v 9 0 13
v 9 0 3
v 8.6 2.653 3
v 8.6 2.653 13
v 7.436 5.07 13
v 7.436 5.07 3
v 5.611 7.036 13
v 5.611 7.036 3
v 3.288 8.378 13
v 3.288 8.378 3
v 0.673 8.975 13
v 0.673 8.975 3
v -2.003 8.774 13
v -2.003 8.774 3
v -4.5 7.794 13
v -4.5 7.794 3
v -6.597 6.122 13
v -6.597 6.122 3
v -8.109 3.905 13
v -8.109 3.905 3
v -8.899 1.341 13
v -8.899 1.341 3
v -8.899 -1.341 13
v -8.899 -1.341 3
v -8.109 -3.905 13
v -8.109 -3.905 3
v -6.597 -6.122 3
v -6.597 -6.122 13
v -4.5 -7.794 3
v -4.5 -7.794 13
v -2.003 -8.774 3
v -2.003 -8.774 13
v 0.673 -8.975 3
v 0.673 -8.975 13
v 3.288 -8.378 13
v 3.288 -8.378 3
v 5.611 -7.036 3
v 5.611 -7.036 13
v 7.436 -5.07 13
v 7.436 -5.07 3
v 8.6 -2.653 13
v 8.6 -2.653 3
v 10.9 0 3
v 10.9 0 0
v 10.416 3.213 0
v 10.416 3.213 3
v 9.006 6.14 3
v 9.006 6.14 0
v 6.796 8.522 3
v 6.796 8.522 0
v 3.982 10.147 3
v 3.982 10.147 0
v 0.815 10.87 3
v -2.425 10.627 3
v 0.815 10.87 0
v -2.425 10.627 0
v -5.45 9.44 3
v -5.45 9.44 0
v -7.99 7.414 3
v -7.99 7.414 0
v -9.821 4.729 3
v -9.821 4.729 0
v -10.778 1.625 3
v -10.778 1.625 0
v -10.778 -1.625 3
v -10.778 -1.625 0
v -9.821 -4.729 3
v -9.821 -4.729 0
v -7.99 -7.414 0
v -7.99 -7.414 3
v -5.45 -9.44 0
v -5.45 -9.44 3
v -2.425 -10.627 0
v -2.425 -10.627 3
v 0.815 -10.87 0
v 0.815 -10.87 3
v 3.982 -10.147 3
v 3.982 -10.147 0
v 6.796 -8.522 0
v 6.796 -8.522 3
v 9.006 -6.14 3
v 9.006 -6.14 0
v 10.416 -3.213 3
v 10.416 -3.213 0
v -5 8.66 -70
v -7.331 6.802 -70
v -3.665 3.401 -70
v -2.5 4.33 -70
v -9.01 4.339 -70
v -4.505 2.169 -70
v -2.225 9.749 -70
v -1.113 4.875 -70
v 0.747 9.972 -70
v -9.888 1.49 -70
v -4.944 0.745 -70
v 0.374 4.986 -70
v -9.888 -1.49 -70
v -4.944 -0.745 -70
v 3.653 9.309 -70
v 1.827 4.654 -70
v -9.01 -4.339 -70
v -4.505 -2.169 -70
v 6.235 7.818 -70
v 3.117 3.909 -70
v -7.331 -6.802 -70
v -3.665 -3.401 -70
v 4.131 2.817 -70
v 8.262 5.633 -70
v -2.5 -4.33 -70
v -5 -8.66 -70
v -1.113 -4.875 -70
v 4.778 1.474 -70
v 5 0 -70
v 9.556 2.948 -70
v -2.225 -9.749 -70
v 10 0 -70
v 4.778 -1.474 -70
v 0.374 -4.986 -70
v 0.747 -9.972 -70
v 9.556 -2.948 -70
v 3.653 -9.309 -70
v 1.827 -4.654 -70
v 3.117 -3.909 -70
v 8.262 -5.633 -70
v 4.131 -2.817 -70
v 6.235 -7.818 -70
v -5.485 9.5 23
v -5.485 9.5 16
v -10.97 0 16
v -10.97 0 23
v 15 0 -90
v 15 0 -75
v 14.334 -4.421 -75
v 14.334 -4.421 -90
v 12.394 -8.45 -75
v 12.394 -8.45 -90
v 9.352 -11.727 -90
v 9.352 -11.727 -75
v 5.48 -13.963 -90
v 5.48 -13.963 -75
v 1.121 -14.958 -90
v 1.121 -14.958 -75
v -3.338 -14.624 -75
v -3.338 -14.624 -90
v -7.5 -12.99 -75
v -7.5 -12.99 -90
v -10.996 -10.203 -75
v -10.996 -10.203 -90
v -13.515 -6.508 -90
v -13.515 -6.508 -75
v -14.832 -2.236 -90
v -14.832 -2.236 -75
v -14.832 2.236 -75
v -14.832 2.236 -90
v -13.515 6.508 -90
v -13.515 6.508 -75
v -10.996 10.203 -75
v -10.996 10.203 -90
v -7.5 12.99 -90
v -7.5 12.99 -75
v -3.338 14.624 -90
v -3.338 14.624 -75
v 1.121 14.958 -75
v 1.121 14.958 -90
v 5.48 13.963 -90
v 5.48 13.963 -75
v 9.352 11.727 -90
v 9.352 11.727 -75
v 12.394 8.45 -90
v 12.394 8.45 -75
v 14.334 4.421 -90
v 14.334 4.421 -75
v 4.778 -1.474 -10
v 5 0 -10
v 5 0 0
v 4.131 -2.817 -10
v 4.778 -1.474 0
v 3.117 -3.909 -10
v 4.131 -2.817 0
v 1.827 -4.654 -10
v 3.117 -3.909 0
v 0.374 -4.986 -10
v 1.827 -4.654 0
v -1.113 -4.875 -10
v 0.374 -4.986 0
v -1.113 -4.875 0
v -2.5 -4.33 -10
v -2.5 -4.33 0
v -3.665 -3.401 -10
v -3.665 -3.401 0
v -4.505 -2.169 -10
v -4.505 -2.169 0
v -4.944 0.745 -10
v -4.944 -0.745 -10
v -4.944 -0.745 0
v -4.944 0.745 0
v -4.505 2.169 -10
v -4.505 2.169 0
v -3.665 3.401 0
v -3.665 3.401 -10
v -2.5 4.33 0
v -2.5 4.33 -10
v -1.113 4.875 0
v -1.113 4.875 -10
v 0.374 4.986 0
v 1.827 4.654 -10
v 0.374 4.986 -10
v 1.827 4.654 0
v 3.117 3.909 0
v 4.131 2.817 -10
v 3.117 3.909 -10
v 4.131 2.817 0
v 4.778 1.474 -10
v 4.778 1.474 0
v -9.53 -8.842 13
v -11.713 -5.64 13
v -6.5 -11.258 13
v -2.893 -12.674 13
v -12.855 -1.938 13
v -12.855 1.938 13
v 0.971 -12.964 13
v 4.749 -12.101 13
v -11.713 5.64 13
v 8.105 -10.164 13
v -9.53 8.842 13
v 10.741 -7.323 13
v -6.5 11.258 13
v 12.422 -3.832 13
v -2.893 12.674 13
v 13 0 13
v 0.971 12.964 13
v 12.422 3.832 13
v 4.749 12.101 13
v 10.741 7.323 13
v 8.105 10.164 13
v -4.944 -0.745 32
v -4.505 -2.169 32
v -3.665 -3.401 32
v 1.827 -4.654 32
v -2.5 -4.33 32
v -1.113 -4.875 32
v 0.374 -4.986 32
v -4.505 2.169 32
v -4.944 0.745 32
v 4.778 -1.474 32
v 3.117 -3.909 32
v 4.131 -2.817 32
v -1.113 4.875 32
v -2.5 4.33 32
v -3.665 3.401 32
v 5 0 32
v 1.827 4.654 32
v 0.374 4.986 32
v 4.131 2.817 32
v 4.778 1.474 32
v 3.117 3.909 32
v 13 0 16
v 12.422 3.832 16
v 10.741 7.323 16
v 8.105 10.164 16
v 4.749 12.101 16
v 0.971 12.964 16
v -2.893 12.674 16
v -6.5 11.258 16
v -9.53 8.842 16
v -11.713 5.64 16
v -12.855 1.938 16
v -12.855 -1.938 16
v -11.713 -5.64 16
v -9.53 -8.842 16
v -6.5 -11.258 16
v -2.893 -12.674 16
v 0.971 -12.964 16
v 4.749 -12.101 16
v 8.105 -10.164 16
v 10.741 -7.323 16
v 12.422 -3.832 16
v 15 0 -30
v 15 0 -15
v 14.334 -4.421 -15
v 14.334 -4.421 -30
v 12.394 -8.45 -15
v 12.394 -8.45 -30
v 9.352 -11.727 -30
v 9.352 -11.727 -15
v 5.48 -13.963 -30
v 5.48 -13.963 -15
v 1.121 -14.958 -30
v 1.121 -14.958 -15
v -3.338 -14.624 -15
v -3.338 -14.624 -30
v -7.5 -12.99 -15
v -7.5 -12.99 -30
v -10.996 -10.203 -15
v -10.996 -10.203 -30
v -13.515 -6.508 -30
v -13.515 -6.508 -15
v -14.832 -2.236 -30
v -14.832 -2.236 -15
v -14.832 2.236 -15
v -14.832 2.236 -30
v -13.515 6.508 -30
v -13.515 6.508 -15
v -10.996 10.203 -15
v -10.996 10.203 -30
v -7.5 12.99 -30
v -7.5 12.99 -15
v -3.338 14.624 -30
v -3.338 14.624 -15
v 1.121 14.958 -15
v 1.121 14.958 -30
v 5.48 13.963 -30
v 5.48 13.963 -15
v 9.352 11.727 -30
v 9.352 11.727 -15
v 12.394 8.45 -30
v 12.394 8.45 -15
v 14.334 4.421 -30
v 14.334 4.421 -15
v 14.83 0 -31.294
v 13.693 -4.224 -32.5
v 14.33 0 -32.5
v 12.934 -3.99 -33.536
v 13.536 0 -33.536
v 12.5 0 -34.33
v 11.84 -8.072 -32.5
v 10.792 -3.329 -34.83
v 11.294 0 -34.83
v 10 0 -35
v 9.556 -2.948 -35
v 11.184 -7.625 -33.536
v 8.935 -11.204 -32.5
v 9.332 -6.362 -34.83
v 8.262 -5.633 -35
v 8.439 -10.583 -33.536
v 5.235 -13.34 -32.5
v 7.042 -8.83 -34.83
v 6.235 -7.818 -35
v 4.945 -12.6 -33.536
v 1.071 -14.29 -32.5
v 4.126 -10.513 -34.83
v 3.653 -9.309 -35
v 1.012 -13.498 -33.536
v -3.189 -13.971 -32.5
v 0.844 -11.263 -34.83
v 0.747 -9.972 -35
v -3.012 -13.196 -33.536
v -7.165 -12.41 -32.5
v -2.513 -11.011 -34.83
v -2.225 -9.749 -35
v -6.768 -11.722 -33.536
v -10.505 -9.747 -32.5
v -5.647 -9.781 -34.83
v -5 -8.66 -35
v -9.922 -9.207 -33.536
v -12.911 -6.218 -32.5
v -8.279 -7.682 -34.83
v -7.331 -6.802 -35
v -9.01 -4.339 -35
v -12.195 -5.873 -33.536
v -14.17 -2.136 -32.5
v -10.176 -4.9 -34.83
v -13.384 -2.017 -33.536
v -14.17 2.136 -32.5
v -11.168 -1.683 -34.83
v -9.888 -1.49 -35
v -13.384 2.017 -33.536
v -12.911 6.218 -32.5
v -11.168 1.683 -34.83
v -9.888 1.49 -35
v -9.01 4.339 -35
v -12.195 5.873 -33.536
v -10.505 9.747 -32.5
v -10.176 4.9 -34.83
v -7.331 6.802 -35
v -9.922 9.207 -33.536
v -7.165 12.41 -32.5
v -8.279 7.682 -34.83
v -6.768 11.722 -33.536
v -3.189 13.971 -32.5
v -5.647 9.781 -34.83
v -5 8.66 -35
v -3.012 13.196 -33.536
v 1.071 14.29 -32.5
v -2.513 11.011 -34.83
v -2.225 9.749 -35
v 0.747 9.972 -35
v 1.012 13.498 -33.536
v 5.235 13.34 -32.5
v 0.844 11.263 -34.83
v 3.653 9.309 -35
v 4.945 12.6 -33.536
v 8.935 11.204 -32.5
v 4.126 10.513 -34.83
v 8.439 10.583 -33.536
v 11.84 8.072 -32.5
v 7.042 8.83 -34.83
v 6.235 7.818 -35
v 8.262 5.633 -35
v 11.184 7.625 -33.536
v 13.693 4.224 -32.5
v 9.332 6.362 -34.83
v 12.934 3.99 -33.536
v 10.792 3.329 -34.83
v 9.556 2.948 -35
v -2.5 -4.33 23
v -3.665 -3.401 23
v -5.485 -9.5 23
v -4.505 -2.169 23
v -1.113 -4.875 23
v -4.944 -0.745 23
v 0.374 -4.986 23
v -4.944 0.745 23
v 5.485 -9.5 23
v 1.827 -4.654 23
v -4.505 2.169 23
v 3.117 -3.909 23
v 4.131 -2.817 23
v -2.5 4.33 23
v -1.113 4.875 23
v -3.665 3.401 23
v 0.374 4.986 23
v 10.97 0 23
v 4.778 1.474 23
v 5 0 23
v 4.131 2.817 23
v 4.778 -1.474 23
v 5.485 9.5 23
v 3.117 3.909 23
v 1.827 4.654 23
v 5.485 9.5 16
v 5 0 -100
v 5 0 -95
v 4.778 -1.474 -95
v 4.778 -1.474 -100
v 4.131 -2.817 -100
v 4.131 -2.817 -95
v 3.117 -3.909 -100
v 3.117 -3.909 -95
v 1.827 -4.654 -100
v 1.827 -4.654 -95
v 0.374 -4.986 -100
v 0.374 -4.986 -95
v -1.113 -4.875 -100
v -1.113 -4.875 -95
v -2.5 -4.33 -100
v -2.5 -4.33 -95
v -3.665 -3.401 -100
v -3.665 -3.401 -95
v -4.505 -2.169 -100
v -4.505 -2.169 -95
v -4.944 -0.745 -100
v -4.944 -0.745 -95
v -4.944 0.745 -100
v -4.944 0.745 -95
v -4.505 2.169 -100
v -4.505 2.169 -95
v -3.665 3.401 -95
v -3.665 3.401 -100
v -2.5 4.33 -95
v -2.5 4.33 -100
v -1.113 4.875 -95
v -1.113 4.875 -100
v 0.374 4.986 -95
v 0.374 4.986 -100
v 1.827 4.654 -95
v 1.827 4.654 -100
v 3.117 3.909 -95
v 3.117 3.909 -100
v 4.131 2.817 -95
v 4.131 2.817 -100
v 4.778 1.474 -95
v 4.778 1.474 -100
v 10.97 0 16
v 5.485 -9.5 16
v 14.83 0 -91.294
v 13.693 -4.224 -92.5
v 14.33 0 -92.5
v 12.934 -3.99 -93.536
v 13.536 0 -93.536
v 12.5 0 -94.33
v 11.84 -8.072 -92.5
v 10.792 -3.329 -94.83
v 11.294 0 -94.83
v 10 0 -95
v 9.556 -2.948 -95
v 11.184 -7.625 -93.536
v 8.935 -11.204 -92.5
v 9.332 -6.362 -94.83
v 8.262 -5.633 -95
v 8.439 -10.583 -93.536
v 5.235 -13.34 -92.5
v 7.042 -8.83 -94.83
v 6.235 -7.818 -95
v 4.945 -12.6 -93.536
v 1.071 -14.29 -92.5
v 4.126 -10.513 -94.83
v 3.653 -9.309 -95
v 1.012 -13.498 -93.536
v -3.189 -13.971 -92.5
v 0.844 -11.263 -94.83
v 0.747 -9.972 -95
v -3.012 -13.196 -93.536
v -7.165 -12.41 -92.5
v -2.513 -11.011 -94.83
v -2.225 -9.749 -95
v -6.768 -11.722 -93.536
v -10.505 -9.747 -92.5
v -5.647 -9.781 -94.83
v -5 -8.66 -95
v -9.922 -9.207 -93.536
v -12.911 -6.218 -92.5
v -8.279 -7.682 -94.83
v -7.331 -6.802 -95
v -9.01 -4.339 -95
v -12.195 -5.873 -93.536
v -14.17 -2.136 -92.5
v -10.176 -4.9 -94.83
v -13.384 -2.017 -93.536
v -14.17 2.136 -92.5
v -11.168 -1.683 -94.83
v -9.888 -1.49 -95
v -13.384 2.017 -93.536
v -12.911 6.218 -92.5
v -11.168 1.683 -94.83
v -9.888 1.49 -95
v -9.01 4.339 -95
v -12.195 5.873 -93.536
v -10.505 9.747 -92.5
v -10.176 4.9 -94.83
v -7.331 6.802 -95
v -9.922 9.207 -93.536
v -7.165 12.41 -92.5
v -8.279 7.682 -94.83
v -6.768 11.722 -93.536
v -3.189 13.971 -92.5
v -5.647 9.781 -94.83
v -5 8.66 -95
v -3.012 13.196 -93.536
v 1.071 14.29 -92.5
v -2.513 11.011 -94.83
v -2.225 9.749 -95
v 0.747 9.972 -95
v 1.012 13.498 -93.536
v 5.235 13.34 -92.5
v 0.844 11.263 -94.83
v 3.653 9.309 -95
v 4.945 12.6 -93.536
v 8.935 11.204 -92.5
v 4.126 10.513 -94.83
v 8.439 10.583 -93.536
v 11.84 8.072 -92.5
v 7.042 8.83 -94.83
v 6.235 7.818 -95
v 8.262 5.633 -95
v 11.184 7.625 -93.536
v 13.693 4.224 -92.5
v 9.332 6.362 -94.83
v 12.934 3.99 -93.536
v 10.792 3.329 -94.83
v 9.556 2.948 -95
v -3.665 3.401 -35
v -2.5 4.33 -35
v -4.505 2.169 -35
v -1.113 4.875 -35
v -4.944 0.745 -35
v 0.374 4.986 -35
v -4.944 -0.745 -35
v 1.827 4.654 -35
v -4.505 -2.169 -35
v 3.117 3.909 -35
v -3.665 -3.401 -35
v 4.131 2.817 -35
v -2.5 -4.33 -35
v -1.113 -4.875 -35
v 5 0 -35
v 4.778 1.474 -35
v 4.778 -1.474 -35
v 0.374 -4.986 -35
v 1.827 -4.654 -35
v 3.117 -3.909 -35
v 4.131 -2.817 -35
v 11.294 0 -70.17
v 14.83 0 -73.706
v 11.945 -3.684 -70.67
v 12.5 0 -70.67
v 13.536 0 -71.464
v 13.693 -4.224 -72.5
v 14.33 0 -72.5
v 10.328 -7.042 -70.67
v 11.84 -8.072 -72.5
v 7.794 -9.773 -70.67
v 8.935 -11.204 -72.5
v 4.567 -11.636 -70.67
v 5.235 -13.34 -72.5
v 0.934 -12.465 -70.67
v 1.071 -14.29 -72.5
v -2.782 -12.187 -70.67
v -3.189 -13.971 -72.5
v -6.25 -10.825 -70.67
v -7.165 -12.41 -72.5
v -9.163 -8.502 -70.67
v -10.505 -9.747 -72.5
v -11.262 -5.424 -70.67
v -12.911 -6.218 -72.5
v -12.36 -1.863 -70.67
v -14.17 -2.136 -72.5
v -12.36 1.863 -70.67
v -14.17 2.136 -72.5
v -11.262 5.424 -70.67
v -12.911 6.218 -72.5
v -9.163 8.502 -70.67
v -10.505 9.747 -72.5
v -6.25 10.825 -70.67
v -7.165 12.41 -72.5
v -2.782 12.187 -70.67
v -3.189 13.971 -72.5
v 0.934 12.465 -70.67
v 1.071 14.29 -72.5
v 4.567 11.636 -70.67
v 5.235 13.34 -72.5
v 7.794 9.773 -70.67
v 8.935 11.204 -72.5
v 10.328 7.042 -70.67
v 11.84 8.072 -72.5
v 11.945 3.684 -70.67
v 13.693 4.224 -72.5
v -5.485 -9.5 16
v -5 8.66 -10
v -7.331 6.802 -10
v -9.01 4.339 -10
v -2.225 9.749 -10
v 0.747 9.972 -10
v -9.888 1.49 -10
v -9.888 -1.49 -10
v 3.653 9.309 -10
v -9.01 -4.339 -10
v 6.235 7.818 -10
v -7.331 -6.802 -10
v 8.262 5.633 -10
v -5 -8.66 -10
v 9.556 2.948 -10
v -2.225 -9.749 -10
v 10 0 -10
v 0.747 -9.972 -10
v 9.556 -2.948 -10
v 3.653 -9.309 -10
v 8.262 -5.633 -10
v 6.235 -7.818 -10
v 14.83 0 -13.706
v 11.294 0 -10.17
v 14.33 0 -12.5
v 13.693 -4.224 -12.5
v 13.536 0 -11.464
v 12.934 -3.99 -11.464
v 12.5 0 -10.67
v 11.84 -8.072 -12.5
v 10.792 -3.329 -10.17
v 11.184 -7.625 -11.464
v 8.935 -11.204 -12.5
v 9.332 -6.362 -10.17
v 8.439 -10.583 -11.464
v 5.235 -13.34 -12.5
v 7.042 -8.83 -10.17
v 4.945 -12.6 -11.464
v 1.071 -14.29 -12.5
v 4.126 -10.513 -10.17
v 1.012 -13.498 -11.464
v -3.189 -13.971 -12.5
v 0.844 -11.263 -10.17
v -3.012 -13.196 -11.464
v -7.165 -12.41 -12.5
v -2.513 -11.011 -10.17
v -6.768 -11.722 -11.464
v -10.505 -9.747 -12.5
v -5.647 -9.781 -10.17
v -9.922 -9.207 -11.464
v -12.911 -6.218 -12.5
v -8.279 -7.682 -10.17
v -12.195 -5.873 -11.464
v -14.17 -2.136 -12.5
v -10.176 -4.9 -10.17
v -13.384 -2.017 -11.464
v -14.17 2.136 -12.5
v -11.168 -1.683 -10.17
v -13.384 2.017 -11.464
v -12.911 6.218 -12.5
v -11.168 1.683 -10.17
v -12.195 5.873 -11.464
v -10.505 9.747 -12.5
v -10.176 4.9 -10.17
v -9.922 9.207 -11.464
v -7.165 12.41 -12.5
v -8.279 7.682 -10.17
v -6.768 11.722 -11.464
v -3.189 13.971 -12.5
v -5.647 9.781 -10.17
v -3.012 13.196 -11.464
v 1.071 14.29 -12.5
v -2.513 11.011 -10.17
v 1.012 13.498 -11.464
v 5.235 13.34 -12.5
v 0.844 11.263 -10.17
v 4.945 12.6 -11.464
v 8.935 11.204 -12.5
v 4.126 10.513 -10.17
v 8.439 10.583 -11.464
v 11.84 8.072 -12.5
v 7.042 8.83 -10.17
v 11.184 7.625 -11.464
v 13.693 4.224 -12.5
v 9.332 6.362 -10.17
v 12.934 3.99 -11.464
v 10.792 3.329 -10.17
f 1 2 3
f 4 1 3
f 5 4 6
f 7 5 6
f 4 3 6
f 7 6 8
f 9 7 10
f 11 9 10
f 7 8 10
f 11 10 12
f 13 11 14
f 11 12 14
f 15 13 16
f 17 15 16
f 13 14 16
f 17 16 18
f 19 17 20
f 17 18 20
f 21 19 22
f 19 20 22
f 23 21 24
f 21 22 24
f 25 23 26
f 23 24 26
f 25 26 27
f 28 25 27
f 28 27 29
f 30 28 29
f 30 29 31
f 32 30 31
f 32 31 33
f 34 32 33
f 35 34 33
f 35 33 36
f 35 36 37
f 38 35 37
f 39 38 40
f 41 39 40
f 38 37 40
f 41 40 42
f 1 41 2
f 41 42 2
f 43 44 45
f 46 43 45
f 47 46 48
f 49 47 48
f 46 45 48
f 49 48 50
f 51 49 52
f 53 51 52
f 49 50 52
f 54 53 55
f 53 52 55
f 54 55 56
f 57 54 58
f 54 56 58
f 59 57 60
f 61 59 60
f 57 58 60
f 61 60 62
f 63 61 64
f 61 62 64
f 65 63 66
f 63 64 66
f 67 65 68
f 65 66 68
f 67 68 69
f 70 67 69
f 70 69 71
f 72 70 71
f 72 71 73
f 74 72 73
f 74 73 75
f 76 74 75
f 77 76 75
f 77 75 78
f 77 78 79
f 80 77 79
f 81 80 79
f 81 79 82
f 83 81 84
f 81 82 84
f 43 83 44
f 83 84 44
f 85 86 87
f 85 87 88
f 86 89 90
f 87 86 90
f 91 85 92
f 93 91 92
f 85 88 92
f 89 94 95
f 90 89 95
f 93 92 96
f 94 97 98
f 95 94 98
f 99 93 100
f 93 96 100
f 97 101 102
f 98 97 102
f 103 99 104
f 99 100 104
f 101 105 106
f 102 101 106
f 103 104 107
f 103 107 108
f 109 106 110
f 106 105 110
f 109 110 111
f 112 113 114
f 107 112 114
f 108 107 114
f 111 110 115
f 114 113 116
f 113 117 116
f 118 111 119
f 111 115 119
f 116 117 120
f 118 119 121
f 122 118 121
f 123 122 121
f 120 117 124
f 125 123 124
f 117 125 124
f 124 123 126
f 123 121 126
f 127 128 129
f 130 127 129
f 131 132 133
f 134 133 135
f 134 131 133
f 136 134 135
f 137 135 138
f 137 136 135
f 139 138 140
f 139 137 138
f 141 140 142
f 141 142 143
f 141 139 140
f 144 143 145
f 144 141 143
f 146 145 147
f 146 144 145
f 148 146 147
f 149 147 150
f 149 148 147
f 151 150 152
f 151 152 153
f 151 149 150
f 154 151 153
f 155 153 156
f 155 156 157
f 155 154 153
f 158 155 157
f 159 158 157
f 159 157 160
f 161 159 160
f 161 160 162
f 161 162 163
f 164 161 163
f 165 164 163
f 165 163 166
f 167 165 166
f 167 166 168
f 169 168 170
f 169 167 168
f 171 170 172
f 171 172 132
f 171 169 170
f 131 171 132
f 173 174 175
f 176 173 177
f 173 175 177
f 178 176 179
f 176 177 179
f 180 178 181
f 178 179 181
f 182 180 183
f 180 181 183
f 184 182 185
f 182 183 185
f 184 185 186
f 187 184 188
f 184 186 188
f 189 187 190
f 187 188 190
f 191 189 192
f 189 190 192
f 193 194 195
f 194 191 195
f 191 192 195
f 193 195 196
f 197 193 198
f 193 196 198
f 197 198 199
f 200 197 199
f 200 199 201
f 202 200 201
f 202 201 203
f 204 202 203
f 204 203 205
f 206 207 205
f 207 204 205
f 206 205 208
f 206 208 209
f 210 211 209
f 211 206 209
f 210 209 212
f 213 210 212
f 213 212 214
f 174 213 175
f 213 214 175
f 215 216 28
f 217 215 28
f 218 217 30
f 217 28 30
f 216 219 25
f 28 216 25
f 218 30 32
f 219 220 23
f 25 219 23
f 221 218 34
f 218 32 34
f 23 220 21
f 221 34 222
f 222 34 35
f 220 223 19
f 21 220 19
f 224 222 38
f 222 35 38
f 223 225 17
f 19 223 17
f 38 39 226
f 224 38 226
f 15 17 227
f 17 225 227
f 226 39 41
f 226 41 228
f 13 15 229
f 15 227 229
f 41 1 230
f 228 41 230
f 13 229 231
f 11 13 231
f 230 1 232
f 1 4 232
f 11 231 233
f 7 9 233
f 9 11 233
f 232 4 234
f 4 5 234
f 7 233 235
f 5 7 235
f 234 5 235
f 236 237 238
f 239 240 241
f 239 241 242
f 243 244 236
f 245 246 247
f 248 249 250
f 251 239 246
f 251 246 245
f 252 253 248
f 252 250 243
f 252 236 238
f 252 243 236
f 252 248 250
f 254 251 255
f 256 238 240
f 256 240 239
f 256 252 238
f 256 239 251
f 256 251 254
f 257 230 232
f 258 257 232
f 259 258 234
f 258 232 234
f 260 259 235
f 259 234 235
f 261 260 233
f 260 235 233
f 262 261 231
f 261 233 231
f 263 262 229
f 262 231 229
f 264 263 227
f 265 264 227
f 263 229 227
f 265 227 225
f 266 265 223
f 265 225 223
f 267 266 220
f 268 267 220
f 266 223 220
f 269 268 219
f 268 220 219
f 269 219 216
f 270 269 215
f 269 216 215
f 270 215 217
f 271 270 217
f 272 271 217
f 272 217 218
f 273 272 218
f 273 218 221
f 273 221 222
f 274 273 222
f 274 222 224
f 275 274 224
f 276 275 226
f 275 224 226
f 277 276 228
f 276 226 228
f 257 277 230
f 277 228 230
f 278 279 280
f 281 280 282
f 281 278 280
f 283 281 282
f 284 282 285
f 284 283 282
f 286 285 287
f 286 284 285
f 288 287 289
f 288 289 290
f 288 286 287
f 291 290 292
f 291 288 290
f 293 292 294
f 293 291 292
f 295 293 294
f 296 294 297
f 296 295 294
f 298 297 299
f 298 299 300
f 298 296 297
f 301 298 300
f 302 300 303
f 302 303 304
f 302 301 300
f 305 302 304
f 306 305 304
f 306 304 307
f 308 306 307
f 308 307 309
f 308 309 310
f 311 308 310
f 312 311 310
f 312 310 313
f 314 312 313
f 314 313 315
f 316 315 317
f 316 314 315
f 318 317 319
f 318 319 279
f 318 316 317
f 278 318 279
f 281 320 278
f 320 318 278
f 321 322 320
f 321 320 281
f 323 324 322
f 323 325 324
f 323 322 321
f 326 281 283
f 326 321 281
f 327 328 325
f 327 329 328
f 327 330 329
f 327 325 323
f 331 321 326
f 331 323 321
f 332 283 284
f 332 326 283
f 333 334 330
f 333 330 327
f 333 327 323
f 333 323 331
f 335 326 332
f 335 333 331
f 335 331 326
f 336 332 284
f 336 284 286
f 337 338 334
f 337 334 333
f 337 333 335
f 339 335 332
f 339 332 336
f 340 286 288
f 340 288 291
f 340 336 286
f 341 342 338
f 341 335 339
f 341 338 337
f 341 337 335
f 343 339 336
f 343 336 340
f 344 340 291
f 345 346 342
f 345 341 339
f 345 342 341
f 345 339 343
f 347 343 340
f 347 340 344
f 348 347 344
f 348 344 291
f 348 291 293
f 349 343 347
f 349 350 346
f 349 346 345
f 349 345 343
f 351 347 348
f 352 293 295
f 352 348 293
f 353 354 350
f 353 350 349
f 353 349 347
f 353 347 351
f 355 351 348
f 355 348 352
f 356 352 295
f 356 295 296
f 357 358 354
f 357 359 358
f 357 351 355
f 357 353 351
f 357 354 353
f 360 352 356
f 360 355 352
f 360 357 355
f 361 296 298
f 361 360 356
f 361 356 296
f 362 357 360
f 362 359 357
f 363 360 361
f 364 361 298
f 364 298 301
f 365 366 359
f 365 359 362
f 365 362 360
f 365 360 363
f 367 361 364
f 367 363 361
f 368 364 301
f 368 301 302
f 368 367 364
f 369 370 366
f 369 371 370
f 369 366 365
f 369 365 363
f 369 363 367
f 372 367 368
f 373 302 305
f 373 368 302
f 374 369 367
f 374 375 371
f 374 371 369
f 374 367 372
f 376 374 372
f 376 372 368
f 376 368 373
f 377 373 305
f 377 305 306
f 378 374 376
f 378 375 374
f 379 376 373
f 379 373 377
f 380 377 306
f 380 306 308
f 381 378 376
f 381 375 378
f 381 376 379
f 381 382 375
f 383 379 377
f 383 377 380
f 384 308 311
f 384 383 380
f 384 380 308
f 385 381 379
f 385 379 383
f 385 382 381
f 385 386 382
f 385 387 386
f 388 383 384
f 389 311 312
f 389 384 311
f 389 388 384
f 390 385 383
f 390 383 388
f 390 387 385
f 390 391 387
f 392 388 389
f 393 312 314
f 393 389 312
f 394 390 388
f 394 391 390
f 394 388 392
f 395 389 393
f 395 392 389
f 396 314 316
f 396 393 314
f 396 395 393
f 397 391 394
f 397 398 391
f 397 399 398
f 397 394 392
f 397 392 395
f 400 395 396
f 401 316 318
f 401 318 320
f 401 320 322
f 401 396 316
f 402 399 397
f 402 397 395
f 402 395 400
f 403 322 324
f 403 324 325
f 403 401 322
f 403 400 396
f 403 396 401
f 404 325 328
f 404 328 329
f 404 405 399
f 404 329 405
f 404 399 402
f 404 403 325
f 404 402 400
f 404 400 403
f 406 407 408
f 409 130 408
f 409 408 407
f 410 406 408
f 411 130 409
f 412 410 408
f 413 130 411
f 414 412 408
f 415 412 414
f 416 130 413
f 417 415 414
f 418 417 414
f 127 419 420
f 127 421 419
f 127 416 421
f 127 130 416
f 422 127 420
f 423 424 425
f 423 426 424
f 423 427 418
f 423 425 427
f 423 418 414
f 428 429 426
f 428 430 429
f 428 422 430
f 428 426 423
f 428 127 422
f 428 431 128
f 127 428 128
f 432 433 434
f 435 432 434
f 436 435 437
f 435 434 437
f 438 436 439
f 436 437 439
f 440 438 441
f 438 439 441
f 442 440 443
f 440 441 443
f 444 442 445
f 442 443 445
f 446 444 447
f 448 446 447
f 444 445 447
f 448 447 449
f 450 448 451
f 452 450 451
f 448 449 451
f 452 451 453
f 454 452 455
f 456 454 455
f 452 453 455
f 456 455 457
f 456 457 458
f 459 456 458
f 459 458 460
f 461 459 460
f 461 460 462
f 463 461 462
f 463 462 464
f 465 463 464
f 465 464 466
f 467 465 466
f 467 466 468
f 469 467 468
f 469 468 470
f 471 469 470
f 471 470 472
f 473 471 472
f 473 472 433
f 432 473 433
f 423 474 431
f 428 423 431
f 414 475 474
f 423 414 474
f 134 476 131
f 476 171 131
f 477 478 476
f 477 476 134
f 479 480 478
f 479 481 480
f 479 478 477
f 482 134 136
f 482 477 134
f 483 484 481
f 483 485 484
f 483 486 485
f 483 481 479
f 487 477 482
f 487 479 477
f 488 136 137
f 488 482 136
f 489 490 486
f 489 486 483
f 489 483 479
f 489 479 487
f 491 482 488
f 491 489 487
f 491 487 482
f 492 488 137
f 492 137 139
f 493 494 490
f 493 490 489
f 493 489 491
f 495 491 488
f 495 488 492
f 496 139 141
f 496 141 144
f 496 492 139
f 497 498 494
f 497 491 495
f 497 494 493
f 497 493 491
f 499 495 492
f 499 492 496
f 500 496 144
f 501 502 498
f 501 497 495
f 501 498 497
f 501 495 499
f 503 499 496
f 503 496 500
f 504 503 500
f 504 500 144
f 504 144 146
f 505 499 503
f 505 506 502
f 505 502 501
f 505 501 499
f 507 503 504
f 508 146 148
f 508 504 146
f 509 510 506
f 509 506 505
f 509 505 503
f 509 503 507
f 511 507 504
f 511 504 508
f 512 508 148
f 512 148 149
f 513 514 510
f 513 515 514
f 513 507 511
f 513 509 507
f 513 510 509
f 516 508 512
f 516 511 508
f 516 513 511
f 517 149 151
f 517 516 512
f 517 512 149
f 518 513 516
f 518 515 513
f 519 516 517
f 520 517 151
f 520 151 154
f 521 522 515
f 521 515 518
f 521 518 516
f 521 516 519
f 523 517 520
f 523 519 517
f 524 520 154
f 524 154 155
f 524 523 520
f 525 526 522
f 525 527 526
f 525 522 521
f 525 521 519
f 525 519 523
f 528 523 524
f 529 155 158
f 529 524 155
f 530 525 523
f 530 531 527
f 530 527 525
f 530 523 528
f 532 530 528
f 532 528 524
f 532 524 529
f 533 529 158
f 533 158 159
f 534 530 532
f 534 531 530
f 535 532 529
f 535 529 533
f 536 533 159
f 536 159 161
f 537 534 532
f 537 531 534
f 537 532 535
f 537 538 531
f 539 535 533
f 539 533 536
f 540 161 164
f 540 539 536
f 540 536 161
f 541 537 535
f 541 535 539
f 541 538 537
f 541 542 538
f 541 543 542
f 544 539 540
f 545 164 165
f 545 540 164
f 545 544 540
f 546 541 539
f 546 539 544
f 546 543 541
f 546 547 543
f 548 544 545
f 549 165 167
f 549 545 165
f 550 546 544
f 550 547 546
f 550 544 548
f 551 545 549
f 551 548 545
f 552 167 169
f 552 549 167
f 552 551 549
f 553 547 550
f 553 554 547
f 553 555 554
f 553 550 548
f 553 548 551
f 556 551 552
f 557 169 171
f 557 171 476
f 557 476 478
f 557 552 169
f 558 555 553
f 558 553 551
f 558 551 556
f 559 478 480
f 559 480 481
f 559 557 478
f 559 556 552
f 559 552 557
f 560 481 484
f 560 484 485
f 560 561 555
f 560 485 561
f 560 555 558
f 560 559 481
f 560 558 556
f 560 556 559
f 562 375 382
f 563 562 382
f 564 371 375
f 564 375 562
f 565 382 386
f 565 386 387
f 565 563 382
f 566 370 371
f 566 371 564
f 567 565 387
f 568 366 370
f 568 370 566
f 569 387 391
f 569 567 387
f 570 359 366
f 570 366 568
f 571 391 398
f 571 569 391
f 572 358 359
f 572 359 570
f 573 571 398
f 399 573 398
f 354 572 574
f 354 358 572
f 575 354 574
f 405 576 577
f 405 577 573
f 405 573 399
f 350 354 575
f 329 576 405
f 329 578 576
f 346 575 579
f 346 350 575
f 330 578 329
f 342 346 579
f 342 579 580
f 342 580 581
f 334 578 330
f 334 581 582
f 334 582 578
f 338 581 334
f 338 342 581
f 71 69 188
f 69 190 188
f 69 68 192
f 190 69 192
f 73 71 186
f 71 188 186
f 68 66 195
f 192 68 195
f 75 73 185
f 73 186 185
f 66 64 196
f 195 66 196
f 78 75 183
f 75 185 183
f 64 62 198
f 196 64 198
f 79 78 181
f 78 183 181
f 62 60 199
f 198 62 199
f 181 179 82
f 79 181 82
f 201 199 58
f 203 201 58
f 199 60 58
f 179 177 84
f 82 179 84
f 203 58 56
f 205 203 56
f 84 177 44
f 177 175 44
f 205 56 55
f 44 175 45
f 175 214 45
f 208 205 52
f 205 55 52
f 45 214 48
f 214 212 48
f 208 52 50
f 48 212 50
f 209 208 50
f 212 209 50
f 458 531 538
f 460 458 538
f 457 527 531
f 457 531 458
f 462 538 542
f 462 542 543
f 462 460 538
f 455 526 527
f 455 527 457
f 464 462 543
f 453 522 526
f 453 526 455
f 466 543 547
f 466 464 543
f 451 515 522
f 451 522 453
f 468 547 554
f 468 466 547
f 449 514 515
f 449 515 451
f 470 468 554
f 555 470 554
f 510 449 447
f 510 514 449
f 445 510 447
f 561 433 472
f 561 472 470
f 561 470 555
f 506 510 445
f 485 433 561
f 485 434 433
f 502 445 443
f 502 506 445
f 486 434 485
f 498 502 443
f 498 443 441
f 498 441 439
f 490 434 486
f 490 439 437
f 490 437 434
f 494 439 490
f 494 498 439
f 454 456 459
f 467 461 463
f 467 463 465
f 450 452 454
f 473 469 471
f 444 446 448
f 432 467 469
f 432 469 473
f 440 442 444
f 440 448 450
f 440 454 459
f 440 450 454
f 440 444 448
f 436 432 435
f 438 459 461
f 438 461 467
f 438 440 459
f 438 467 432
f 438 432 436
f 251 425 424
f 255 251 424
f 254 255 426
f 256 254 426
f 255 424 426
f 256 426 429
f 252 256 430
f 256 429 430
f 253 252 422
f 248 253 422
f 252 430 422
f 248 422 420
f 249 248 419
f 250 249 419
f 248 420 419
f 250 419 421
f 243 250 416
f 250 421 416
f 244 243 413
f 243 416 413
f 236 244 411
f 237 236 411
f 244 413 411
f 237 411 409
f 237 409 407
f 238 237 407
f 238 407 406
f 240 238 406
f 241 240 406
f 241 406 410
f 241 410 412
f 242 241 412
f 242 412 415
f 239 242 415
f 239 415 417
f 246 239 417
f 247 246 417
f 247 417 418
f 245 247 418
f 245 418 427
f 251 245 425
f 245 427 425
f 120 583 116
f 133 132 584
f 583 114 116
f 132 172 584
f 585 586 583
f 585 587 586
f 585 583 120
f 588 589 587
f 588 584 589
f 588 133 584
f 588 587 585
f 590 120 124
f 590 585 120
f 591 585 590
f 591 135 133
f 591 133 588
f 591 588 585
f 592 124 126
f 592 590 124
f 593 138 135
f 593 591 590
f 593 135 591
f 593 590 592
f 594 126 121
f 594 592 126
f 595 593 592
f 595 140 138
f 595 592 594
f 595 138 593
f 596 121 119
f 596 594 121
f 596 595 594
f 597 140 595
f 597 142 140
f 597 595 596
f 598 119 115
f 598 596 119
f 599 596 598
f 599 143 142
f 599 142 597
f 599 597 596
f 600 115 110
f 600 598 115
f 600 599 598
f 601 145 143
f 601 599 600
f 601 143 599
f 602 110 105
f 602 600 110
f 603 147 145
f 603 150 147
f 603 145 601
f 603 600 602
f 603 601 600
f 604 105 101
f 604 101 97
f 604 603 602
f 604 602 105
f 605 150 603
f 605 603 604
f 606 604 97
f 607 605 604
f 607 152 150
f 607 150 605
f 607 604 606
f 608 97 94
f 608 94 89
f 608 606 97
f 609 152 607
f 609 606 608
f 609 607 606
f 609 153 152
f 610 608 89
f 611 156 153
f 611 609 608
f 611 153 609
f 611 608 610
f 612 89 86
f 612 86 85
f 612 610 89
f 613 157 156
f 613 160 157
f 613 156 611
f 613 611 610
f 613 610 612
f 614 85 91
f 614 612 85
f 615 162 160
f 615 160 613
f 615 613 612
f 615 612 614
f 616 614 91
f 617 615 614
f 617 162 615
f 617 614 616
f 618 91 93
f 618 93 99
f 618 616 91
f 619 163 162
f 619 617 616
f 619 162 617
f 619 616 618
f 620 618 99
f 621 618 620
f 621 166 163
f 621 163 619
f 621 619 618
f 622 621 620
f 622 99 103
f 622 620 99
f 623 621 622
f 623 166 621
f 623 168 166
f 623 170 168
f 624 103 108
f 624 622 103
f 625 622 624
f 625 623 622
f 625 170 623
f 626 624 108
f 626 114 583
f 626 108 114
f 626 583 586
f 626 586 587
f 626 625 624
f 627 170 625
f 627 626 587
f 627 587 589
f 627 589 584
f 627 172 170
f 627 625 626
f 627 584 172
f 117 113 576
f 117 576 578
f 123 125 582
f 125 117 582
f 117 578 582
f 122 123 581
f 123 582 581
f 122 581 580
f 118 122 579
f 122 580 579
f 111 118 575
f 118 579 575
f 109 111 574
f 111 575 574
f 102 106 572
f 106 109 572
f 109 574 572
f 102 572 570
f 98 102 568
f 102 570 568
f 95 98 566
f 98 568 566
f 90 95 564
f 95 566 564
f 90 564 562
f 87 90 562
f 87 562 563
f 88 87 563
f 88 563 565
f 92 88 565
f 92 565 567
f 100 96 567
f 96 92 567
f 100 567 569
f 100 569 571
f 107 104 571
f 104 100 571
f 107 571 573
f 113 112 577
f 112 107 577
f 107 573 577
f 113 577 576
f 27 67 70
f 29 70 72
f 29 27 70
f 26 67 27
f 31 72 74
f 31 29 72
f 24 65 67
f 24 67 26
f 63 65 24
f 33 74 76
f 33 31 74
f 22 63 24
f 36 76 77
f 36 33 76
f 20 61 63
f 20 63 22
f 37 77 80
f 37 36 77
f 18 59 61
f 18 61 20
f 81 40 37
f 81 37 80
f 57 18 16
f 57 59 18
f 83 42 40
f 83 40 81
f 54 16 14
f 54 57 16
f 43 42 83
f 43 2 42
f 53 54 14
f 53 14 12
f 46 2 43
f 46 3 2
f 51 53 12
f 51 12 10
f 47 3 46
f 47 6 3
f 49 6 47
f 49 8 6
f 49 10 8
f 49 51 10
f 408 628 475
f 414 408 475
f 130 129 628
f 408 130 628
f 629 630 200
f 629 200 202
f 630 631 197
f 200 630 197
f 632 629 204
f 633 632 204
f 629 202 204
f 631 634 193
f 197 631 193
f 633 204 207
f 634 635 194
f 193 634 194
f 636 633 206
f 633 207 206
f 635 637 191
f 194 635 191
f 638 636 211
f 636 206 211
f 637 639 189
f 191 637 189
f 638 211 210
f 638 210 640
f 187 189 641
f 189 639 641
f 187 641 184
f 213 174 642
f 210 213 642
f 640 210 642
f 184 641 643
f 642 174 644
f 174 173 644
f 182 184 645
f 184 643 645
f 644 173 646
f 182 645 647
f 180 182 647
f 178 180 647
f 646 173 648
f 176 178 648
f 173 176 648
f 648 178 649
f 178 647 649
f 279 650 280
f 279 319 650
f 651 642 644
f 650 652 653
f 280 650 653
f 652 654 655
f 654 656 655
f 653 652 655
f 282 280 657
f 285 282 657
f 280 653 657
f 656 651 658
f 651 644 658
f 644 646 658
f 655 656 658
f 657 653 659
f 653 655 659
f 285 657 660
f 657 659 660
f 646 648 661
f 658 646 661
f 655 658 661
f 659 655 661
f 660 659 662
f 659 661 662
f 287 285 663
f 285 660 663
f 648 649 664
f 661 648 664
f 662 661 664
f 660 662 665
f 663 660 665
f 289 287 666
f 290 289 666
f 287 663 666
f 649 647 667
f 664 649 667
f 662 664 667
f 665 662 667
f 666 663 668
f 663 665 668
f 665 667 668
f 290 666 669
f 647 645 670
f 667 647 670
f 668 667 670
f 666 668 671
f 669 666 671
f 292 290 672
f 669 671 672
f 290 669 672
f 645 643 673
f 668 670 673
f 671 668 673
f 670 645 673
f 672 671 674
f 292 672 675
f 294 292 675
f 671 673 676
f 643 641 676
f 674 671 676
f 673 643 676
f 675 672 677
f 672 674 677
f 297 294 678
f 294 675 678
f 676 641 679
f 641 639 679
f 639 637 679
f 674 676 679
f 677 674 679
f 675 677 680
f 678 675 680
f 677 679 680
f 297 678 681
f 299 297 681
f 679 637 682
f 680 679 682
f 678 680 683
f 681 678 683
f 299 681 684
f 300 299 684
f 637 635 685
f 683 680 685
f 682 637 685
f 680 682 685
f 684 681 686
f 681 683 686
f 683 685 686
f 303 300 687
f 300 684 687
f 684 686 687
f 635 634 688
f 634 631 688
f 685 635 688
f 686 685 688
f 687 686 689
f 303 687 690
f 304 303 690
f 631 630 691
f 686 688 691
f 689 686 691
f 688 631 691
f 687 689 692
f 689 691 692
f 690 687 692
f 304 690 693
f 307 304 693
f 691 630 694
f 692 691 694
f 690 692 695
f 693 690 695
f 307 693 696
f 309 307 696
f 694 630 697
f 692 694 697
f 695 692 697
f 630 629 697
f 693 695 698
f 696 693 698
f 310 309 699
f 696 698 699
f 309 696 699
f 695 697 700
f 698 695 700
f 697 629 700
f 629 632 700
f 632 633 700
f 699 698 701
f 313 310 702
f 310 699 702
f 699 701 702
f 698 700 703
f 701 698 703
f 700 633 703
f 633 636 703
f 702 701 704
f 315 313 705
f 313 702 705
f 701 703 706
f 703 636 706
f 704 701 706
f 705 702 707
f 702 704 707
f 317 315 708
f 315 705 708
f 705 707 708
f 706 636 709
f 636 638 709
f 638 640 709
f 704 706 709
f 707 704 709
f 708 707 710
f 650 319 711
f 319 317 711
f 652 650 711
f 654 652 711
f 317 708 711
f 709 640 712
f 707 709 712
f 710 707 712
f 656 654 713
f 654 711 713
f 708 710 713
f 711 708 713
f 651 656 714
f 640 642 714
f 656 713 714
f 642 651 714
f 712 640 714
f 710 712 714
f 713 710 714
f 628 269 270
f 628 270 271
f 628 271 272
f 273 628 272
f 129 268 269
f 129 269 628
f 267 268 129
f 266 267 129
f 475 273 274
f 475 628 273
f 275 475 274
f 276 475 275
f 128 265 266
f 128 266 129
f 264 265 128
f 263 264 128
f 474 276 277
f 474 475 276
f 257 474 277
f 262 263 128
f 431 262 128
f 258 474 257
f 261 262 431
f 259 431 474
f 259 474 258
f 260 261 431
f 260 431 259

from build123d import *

# Parameters (mm, degrees)
F0_R      = 10.9
F1_DEPTH  = 3
F2_R      = 9
F3_DEPTH  = 10
F4_R      = 13
F5_DEPTH  = 3
F7_DEPTH  = 7
F8_R      = 5
F9_DEPTH  = 9
F10_R     = 5
F11_DEPTH = 100
F13_R     = 15
F14_DEPTH = 25
F16_R     = 15
F17_DEPTH = 25
F18_R     = 5


with BuildPart() as f1:
    # F0 (on Top) → F1 (new body)
    with BuildSketch(Plane.XY):
        Circle(F0_R)
    extrude(amount=F1_DEPTH)

    # F2 (on face) → F3 (join)
    with BuildSketch(Plane.XY.offset(3)):
        Circle(F2_R)
    extrude(amount=F3_DEPTH)

    # F4 (on face) → F5 (join)
    with BuildSketch(Plane.XY.offset(13)):
        Circle(F4_R)
    extrude(amount=F5_DEPTH)

    # F6 (on face) → F7 (join)
    with BuildSketch(Plane.XY.offset(16)):
        Polygon((-5.484828, -9.5), (5.484828, -9.5), (10.969655, 0), (5.484828, 9.5), (-5.484828, 9.5), (-10.969655, 0), align=None)
    extrude(amount=F7_DEPTH)

    # F8 (on face) → F9 (join)
    with BuildSketch(Plane.XY.offset(23)):
        Circle(F8_R)
    extrude(amount=F9_DEPTH)

    # F10 (on face) → F11 (join)
    with BuildSketch(Plane(origin=(0, 0, 0), x_dir=(1, 0, 0), z_dir=(0, 0, -1))):
        Circle(F10_R)
    extrude(amount=F11_DEPTH)

    # F13 (on offset) → F14 (join)
    with BuildSketch(Plane(origin=(0, 0, -95), x_dir=(1, 0, 0), z_dir=(0, 0, -1))):
        Circle(F13_R)
    extrude(amount=-F14_DEPTH)

    # F16 (on offset) → F17 (join)
    with BuildSketch(Plane(origin=(0, 0, -35), x_dir=(1, 0, 0), z_dir=(0, 0, -1))):
        Circle(F16_R)
    extrude(amount=-F17_DEPTH)

    # F18
    f18_edges = [f1.edges().sort_by_distance(p)[0] for p in [
        (-15, 0, -70),
        (-15, 0, -95),
        (-15, 0, -10),
        (-15, 0, -35),
    ]]
    fillet(f18_edges, radius=F18_R)


solid = f1.part
